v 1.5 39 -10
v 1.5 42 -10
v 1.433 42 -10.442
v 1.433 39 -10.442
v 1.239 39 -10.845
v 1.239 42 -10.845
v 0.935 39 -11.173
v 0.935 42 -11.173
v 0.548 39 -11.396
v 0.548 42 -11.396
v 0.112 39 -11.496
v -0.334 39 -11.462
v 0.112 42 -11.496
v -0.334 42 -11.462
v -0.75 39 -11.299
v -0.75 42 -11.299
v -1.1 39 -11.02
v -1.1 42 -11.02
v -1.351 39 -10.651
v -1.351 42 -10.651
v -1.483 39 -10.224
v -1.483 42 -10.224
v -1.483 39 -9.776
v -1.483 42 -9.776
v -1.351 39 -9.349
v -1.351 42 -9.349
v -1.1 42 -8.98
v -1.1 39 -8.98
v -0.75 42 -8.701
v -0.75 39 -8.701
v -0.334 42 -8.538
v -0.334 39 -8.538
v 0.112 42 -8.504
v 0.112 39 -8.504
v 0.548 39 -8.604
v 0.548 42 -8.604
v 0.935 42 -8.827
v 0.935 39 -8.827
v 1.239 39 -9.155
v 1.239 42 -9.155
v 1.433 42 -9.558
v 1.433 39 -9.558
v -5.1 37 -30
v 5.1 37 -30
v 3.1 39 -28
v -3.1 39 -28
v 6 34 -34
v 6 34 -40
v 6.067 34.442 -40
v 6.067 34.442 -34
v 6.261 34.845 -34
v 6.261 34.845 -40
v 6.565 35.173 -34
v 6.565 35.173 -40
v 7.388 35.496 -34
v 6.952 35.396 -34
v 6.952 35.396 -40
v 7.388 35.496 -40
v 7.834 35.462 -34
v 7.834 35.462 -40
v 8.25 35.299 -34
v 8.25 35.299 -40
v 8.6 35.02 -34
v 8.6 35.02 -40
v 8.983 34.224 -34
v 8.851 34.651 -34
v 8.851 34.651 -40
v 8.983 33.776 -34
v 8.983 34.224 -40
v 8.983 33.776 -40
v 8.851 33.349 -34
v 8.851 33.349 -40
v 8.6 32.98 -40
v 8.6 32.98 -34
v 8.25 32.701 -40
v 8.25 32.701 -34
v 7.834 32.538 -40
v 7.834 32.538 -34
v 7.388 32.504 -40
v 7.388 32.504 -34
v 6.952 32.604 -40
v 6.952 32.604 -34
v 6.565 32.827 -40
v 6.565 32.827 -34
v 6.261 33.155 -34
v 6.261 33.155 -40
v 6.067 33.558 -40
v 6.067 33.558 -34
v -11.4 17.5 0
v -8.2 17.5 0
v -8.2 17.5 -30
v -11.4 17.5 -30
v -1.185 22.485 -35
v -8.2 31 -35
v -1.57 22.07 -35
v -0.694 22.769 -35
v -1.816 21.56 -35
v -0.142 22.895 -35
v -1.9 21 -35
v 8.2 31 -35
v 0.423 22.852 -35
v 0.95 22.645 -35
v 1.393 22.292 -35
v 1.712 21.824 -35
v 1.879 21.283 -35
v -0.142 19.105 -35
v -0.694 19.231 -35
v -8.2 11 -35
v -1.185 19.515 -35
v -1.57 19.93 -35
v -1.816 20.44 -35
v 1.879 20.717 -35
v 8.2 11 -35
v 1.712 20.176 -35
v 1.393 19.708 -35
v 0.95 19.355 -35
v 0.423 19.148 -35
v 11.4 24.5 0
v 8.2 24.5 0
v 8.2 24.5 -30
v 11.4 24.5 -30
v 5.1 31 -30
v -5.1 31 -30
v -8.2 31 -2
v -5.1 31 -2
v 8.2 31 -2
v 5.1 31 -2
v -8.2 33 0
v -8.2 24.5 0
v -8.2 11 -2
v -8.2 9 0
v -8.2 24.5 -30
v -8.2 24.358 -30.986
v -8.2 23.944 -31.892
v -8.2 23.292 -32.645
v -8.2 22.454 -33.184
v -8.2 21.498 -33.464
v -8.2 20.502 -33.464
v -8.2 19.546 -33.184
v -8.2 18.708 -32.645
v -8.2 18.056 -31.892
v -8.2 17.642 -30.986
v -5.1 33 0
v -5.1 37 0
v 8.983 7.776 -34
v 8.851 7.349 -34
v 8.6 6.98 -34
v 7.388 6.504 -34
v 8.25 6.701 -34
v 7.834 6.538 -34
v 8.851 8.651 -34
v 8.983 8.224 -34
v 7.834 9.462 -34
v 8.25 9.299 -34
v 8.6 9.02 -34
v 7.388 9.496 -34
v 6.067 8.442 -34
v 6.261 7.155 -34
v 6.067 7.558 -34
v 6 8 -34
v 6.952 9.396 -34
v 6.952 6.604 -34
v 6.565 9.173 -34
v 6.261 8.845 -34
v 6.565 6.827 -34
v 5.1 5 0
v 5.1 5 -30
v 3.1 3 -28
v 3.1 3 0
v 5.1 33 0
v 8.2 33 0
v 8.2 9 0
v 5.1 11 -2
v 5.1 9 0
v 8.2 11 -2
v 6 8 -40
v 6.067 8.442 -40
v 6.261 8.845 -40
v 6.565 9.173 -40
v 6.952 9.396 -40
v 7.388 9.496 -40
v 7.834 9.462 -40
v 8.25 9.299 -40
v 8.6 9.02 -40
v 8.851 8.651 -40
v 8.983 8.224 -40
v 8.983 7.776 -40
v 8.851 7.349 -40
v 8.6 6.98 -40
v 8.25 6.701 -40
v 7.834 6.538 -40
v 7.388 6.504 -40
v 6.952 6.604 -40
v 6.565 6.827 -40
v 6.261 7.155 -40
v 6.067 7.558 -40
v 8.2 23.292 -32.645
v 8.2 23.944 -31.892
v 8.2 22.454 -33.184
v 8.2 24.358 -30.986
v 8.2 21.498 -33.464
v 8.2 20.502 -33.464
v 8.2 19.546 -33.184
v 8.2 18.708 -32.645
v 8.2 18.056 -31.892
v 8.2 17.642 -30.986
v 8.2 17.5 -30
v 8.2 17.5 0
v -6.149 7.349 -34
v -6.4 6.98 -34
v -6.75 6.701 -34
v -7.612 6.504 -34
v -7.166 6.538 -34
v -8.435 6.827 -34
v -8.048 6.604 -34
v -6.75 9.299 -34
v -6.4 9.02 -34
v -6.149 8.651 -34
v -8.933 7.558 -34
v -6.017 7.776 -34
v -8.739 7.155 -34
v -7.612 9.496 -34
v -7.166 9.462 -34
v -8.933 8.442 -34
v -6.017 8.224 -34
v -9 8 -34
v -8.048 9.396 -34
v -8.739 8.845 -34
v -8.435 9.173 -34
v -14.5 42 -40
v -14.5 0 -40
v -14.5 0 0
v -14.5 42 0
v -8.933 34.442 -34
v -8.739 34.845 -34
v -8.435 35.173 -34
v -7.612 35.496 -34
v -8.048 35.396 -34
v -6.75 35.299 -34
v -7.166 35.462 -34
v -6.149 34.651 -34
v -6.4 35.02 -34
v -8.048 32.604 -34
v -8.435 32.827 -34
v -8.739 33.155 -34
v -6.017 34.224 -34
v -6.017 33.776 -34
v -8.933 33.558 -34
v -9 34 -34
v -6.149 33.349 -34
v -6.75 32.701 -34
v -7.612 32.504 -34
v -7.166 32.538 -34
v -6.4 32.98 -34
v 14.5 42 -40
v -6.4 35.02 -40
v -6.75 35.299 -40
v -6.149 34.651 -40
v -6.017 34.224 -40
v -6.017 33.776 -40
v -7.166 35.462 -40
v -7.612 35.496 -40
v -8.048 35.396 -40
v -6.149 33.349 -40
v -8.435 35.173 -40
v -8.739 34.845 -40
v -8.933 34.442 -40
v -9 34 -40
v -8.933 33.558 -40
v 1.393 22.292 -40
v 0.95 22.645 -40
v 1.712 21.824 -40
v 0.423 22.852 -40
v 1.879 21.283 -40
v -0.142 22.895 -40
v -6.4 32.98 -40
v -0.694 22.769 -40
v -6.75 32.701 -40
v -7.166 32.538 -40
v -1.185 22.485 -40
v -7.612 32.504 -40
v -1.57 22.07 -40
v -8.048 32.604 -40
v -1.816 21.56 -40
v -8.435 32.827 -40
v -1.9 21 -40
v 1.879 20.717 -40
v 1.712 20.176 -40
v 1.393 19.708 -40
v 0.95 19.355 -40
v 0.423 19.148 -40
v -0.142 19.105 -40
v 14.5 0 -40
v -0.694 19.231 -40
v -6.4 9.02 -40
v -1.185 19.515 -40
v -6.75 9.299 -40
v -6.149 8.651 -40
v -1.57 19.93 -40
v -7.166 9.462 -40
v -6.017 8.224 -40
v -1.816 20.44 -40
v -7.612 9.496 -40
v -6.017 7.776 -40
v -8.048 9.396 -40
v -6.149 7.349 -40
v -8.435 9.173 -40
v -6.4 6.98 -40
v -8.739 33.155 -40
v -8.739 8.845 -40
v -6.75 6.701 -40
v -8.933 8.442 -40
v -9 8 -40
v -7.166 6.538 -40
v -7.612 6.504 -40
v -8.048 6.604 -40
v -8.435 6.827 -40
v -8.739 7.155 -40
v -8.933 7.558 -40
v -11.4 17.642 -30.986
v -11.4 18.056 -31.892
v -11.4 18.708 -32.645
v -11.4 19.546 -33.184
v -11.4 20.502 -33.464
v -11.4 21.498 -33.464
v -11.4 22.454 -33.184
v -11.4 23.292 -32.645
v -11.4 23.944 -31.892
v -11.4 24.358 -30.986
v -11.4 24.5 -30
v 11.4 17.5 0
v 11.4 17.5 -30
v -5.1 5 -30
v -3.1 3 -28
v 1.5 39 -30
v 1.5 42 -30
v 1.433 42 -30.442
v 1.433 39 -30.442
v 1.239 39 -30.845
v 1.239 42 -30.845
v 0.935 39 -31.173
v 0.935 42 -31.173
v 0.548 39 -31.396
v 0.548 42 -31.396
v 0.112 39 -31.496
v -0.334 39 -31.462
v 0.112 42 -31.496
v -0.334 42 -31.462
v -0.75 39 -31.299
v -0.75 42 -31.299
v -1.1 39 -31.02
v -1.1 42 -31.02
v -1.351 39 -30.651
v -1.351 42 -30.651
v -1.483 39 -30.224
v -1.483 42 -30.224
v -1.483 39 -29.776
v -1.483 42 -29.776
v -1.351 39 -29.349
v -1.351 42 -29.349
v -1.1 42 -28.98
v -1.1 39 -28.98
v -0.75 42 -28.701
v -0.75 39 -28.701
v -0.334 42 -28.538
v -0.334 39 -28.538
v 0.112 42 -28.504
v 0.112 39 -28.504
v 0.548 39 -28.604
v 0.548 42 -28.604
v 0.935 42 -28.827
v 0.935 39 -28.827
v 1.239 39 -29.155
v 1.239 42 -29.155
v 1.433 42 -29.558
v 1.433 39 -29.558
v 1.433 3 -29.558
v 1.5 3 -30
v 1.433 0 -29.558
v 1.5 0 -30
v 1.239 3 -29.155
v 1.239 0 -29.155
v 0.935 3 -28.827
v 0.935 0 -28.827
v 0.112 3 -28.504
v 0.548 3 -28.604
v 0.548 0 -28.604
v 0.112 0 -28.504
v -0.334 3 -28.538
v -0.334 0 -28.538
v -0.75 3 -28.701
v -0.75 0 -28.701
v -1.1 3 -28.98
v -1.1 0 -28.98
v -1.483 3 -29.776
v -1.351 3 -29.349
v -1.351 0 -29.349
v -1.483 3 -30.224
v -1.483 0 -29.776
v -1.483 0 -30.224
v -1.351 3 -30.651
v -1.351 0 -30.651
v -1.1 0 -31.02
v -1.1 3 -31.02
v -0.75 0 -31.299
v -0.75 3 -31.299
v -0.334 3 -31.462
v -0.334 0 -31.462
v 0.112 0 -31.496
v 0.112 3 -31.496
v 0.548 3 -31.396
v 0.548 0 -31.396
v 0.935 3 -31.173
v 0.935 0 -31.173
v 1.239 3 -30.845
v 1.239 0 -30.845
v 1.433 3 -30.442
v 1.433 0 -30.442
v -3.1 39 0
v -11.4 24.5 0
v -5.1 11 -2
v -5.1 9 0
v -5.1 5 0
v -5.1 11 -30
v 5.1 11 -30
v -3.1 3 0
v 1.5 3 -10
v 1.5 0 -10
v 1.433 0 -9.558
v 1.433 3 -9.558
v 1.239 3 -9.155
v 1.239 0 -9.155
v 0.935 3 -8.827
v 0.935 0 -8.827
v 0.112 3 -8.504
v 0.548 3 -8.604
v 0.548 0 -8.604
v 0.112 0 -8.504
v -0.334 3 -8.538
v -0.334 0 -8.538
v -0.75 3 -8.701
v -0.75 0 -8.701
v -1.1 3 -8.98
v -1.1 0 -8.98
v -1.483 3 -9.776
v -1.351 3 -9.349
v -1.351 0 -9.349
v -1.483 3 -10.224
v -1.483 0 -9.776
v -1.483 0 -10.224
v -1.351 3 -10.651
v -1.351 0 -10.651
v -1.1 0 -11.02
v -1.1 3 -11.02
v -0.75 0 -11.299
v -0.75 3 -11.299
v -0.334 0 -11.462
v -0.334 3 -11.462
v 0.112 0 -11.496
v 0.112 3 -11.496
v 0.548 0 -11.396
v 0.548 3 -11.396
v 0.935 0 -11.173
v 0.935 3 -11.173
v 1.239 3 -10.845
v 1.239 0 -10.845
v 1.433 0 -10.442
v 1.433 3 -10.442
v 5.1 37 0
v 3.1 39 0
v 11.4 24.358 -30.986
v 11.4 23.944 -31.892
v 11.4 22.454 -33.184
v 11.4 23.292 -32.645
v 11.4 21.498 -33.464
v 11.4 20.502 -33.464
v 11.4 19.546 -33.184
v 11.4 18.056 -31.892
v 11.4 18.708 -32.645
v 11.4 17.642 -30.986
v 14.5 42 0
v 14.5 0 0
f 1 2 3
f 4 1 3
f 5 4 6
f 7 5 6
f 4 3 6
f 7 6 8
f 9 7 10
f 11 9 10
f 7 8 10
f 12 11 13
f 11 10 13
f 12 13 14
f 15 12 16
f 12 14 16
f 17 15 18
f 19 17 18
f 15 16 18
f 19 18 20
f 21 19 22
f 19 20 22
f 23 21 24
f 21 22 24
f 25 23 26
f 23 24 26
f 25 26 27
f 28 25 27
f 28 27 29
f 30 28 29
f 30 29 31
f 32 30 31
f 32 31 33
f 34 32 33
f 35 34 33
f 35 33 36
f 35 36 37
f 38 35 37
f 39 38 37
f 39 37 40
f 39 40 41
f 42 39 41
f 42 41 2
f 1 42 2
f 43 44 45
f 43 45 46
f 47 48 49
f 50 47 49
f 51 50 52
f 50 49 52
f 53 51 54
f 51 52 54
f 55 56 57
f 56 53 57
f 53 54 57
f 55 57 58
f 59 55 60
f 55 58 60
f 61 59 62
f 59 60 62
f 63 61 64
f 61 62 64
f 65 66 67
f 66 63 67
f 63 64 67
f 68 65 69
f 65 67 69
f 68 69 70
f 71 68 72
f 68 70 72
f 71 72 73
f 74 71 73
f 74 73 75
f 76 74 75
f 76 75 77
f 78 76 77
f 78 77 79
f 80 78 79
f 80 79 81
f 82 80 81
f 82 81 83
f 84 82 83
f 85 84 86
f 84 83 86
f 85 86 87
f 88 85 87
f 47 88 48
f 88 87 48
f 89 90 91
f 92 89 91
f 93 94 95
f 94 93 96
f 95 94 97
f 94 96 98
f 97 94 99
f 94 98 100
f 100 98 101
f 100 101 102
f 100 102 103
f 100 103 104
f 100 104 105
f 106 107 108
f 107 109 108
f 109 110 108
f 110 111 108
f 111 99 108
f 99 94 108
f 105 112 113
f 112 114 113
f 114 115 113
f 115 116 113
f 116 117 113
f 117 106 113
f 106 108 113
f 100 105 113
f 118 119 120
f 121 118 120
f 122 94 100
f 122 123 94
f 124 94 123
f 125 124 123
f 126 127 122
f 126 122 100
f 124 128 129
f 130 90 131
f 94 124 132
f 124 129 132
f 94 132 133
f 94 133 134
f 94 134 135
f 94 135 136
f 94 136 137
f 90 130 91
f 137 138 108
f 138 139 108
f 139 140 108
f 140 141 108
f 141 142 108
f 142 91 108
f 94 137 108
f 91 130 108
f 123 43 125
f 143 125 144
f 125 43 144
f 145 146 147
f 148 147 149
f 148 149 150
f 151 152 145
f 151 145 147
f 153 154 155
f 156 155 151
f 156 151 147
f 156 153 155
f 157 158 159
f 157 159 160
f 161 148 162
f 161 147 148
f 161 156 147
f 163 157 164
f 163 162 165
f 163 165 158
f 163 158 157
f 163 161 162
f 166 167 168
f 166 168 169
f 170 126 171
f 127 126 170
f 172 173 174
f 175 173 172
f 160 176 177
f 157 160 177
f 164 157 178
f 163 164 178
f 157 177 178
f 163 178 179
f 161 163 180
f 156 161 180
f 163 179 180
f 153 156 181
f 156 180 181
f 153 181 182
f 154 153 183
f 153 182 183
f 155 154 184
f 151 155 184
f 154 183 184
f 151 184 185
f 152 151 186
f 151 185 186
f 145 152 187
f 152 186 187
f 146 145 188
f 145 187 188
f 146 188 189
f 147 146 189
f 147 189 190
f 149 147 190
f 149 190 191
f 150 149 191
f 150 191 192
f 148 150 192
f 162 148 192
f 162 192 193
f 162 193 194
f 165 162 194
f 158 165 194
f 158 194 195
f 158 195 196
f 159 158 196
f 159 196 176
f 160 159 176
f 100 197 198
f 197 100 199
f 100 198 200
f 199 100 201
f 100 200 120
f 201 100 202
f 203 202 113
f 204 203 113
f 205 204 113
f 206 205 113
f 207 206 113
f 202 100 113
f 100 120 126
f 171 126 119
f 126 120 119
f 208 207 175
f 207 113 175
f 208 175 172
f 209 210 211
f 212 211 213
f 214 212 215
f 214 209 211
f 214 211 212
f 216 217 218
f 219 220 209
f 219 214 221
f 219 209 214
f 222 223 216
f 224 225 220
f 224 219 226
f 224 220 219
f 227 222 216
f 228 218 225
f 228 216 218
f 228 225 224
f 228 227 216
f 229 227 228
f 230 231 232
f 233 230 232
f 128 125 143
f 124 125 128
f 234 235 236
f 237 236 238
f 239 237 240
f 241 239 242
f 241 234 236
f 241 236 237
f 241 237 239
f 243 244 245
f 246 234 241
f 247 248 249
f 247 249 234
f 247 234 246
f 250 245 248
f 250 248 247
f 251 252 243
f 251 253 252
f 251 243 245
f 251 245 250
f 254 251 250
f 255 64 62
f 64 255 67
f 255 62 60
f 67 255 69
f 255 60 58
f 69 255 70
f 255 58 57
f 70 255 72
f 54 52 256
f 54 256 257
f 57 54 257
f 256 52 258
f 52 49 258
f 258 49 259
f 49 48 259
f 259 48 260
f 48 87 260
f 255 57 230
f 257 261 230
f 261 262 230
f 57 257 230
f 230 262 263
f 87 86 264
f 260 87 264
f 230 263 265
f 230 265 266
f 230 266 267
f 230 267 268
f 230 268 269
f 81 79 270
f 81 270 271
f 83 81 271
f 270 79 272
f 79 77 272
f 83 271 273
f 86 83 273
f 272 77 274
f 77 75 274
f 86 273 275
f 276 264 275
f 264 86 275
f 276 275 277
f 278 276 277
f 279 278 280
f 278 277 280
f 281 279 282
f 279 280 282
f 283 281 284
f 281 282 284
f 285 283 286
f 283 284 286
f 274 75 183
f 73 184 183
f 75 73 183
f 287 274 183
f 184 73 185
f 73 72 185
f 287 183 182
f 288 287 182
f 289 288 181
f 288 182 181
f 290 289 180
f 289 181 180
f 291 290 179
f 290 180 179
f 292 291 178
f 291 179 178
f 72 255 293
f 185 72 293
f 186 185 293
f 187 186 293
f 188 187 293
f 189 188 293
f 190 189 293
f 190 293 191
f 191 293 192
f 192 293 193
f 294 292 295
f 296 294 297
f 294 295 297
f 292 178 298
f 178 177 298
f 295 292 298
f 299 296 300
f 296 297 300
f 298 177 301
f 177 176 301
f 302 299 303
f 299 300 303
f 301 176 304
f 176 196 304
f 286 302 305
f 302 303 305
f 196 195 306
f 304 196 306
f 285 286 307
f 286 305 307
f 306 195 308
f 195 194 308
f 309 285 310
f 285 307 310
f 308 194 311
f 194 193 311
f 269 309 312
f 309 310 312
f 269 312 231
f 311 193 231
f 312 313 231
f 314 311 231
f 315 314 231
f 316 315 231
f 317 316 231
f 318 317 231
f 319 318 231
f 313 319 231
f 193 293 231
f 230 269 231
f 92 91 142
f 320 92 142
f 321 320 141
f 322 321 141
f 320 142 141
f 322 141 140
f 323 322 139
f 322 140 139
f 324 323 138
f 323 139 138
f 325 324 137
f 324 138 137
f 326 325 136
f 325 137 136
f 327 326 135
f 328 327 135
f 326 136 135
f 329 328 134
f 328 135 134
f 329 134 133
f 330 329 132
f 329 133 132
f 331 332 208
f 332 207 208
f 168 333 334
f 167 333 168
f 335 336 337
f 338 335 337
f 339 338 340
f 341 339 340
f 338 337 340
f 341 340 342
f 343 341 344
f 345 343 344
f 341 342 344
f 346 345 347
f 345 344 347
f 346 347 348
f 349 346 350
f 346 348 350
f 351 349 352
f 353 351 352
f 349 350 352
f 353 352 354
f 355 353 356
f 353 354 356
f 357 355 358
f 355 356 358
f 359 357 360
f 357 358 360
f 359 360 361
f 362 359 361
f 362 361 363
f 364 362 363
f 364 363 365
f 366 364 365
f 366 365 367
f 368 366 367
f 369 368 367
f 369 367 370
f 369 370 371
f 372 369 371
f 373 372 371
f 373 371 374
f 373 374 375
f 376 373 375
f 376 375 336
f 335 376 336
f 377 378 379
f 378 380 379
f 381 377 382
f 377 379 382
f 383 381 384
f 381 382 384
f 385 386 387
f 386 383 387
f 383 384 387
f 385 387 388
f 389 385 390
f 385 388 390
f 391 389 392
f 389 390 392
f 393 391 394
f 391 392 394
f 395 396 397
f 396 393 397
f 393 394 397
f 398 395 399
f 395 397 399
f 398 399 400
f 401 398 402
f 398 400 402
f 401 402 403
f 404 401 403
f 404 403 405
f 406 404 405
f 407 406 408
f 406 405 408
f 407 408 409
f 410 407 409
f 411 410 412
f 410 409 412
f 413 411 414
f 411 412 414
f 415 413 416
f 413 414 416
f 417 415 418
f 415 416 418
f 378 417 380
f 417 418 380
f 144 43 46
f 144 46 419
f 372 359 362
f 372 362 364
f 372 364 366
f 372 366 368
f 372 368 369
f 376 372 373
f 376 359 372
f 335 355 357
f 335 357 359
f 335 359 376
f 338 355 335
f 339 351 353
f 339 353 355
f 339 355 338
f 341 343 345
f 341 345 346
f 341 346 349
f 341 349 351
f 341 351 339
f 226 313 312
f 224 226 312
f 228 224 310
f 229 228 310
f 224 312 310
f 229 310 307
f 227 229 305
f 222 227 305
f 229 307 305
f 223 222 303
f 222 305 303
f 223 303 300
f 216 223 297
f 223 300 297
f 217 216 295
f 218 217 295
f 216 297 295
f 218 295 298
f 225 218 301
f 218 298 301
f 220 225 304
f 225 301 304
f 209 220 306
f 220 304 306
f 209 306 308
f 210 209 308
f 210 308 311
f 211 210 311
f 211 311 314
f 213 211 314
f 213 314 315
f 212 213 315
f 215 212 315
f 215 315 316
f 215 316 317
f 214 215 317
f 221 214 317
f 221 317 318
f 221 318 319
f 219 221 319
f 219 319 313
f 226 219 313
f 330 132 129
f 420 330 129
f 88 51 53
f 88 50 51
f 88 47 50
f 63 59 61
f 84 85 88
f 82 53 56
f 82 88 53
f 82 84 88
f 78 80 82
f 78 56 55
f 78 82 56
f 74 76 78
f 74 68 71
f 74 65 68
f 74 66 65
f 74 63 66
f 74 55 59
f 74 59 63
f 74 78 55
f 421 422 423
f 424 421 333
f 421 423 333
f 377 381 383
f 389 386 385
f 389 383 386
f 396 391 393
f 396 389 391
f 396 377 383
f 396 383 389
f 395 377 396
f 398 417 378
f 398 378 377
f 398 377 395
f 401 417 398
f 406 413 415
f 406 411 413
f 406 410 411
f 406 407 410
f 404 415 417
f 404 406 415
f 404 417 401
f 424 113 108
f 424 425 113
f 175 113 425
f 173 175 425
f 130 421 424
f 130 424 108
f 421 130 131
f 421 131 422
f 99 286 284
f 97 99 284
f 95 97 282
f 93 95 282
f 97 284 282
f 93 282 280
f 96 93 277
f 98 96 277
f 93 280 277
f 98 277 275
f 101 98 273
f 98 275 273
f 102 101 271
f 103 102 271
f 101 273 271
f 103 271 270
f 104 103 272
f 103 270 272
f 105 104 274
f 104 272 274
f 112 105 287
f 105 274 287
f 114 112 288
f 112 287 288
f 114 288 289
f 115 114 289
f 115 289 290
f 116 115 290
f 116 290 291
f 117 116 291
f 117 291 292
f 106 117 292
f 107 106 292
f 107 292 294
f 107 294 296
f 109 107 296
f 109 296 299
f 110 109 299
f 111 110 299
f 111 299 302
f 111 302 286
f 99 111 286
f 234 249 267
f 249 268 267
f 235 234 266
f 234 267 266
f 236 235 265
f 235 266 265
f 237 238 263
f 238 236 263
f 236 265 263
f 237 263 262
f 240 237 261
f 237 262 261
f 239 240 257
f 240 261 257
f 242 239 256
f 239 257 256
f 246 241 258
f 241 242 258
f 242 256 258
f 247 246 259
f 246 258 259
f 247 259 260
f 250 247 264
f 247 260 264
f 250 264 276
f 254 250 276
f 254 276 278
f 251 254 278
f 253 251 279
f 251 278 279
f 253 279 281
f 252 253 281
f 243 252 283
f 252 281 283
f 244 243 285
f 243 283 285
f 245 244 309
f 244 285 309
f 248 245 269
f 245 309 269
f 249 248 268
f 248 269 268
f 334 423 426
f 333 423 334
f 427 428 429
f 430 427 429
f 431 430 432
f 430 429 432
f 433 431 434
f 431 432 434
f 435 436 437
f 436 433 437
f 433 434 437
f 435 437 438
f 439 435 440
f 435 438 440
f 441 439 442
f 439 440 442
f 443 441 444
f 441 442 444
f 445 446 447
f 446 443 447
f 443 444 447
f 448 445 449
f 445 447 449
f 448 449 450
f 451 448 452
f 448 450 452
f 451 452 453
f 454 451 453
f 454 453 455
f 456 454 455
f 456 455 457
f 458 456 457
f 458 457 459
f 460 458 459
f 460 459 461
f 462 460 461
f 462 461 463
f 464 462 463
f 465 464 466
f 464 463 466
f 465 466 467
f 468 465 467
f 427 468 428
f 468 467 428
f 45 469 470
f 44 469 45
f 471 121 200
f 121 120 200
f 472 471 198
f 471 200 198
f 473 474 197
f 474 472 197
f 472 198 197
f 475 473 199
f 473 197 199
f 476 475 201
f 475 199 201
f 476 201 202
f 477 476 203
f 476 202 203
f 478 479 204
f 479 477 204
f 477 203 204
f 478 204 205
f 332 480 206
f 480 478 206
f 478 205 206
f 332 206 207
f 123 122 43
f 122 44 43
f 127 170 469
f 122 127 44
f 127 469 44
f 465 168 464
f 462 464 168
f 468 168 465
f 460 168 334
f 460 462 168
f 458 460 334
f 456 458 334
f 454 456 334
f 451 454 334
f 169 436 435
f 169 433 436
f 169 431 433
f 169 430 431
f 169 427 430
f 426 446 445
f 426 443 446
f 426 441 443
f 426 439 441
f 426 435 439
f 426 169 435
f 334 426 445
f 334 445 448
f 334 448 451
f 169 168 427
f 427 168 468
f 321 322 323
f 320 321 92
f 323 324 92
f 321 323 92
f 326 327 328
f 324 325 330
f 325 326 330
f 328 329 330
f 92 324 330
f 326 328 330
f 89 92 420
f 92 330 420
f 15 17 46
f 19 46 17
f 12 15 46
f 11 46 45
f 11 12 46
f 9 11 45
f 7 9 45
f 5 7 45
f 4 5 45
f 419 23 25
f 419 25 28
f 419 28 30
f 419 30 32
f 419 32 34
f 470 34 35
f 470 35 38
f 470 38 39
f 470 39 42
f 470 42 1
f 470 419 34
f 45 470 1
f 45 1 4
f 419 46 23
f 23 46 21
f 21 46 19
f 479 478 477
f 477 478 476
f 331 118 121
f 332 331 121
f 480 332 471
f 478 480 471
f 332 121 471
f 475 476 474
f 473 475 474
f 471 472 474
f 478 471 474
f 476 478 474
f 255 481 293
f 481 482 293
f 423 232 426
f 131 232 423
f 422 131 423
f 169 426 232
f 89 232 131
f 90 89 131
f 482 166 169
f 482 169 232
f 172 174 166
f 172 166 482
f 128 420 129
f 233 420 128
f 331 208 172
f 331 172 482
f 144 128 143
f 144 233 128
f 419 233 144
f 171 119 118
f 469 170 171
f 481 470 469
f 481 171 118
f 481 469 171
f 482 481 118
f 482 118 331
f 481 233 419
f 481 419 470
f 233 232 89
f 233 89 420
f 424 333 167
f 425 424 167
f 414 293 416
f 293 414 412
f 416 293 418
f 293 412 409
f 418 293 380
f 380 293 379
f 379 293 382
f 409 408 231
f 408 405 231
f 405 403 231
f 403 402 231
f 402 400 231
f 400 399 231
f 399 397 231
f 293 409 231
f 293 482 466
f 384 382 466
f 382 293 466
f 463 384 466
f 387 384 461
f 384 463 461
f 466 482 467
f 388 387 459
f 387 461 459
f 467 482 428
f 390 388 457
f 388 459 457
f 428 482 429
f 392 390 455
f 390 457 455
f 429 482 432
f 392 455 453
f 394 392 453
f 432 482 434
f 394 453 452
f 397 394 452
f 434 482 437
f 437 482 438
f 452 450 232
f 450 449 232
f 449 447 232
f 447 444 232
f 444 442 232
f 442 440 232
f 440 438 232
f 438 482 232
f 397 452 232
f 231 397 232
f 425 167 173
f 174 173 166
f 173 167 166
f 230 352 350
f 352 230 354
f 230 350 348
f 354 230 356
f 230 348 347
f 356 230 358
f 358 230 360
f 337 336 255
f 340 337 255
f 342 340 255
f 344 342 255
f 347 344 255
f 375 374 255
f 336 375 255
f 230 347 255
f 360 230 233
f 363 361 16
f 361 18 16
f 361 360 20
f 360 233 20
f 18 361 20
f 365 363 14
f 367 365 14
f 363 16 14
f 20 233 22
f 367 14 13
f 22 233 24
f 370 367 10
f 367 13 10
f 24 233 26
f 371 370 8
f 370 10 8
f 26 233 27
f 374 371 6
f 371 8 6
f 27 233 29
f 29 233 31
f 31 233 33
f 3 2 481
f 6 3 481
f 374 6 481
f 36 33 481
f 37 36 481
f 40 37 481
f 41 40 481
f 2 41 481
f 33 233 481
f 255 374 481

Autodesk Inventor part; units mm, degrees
ref_plane "YZ Plane" through (0, 0, 0) normal (1, 0, 0) x (0, 1, 0)
ref_plane "XZ Plane" through (0, 0, 0) normal (0, 1, 0) x (-1, 0, 0)
sketch "Sketch1" plane through (0, 0, 0) normal (0, 1, 0) x (-1, 0, 0)
  line L0 (8.2, 0) -> (8.2, -35)
  line L1 (8.2, -35) -> (-8.2, -35)
  line L2 (-8.2, -35) -> (-8.2, 0)
  line L3 (-8.2, 0) -> (0, 0)
  line L4 (0, 0) -> (8.2, 0)
  line L5 (-8.2, 0) -> (-14.5, 0)
  line L6 (-14.5, 0) -> (-14.5, -40)
  line L7 (-14.5, -40) -> (14.5, -40)
  line L8 (14.5, -40) -> (14.5, 0)
  line L9 (14.5, 0) -> (8.2, 0)
  line L10 (5.1, 0) -> (5.1, -30)
  line L11 (5.1, -30) -> (-5.1, -30)
  line L12 (-5.1, -30) -> (-5.1, 0)
  line L13 (-5.1, -30) -> (-8.2, -30) construction
  line L14 (5.1, -30) -> (8.2, -30) construction
  dimension "d2" = 5
  dimension "d17" = 5
  dimension "d26" = 29
  dimension "d27" = 10.2
  dimension "d28" = 16.4
  dimension "d29" = 40
extrude "Extrusion1" add sketch "Sketch1" along normal blind 42 contours L9 L8 L7 L6 L5 L2 L1 L0
sketch "Sketch2" plane through (14.5, 0, 0) normal (1, 0, 0) x (0, 0, -1)
  line L0 (0, 0) -> (40, 0) projected
  line L1 (40, 0) -> (40, 42) projected
  line L2 (0, 42) -> (40, 42) projected
  line L3 (0, 0) -> (0, 42) projected
  line L4 (0, 21) -> (0, 21) construction
  circle A0 centre (0, 21) radius 3.5
  line L5 (0, 21) -> (30, 21) construction
  circle A1 centre (30, 21) radius 3.5
  line L6 (0, 24.5) -> (30, 24.5)
  line L7 (30, 17.5) -> (0, 17.5)
  line L8 (0, 0) -> (0, 42) projected
  point P0 (0, 21)
  dimension "d6" = 7
  dimension "d8" = 0
  dimension "d40" = 30
extrude "Extrusion2" cut sketch "Sketch2" along normal blind 3.2 from surface at -6.3 contours A0 L3 | L3 A0 | A0 L6 A1 L7 | A1
sketch "Sketch3" plane through (14.5, 0, -40) normal (0, 0, -1) x (-1, 0, 0)
  line L0 (0, 0) -> (29, 0) projected
  line L1 (29, 0) -> (29, 42) projected
  line L2 (0, 42) -> (29, 42) projected
  line L3 (0, 0) -> (0, 42) projected
  line L4 (29, 0) -> (29, 42) construction
  line L5 (29, 21) -> (14.5, 21) construction
  line L6 (14.5, 21) -> (14.5, 0) construction
  circle A0 centre (14.5, 21) radius 1.9
  dimension "d11" = 3.8
extrude "Extrusion3" cut sketch "Sketch3" against normal blind 10 contours A0
extrude "Extrusion4" add sketch "Sketch1" along normal blind 11 contours L0 L1 L2 L3 L12 L11 L10 L4
extrude "Extrusion5" add sketch "Sketch1" along normal blind 3 contours L10 L11 L12 L3 L4
chamfer "Chamfer1" distance 2 angle 45 3 edges at (-5.1, 3, -15) (0, 3, -30) (5.1, 3, -15)
chamfer "Chamfer2" distance 2 angle 45 2 edges at (-6.65, 11, 0) (6.65, 11, 0)
ref_plane "Work Plane1" through (0, 21, 0) normal (0, 1, 0) x (1, 0, 0)
mirror "Mirror1" about plane through (0, 21, 0) normal (0, 1, 0) of "Extrusion4", "Extrusion5", "Chamfer1", "Chamfer2"
sketch "Sketch4" plane through (0, 42, 0) normal (0, 1, 0) x (1, 0, 0)
  line L0 (-14.5, 0) -> (14.5, 0) projected
  line L1 (14.5, 0) -> (14.5, 40) projected
  line L2 (14.5, 40) -> (-14.5, 40) projected
  line L3 (-14.5, 40) -> (-14.5, 0) projected
  line L4 (0, 0) -> (0, 10) construction
  circle A0 centre (0, 10) radius 1.5
  line L5 (0, 10) -> (0, 30) construction
  circle A1 centre (0, 30) radius 1.5
  dimension "d30" = 3
  dimension "d31" = 10
  dimension "d32" = 20
extrude "Extrusion6" cut sketch "Sketch4" against normal up to surface (3 mm away) contours A0 | A1
sketch "Sketch5" plane through (14.5, 0, -40) normal (0, 0, -1) x (-1, 0, 0)
  circle A0 centre (14.5, 21) radius 1.9 projected
  line L0 (0, 0) -> (29, 0) projected
  line L1 (29, 0) -> (29, 42) projected
  line L2 (0, 42) -> (29, 42) projected
  line L3 (0, 0) -> (0, 42) projected
  line L4 (14.5, 0) -> (14.5, 8) construction
  line L5 (14.5, 8) -> (22, 8) construction
  line L6 (14.5, 8) -> (7, 8) construction
  circle A1 centre (7, 8) radius 1.5
  circle A2 centre (22, 8) radius 1.5
  dimension "d35" = 8
  dimension "d36" = 3
  dimension "d39" = 15
extrude "Extrusion7" cut sketch "Sketch5" against normal blind 6 contours A1 | A2
mirror "Mirror2" about plane through (0, 21, 0) normal (0, 1, 0) of "Extrusion6", "Extrusion7"
mirror "Mirror3" about plane through (0, 0, 0) normal (1, 0, 0) of "Extrusion2"
properties part number "tensionerholder_3DPrint"
